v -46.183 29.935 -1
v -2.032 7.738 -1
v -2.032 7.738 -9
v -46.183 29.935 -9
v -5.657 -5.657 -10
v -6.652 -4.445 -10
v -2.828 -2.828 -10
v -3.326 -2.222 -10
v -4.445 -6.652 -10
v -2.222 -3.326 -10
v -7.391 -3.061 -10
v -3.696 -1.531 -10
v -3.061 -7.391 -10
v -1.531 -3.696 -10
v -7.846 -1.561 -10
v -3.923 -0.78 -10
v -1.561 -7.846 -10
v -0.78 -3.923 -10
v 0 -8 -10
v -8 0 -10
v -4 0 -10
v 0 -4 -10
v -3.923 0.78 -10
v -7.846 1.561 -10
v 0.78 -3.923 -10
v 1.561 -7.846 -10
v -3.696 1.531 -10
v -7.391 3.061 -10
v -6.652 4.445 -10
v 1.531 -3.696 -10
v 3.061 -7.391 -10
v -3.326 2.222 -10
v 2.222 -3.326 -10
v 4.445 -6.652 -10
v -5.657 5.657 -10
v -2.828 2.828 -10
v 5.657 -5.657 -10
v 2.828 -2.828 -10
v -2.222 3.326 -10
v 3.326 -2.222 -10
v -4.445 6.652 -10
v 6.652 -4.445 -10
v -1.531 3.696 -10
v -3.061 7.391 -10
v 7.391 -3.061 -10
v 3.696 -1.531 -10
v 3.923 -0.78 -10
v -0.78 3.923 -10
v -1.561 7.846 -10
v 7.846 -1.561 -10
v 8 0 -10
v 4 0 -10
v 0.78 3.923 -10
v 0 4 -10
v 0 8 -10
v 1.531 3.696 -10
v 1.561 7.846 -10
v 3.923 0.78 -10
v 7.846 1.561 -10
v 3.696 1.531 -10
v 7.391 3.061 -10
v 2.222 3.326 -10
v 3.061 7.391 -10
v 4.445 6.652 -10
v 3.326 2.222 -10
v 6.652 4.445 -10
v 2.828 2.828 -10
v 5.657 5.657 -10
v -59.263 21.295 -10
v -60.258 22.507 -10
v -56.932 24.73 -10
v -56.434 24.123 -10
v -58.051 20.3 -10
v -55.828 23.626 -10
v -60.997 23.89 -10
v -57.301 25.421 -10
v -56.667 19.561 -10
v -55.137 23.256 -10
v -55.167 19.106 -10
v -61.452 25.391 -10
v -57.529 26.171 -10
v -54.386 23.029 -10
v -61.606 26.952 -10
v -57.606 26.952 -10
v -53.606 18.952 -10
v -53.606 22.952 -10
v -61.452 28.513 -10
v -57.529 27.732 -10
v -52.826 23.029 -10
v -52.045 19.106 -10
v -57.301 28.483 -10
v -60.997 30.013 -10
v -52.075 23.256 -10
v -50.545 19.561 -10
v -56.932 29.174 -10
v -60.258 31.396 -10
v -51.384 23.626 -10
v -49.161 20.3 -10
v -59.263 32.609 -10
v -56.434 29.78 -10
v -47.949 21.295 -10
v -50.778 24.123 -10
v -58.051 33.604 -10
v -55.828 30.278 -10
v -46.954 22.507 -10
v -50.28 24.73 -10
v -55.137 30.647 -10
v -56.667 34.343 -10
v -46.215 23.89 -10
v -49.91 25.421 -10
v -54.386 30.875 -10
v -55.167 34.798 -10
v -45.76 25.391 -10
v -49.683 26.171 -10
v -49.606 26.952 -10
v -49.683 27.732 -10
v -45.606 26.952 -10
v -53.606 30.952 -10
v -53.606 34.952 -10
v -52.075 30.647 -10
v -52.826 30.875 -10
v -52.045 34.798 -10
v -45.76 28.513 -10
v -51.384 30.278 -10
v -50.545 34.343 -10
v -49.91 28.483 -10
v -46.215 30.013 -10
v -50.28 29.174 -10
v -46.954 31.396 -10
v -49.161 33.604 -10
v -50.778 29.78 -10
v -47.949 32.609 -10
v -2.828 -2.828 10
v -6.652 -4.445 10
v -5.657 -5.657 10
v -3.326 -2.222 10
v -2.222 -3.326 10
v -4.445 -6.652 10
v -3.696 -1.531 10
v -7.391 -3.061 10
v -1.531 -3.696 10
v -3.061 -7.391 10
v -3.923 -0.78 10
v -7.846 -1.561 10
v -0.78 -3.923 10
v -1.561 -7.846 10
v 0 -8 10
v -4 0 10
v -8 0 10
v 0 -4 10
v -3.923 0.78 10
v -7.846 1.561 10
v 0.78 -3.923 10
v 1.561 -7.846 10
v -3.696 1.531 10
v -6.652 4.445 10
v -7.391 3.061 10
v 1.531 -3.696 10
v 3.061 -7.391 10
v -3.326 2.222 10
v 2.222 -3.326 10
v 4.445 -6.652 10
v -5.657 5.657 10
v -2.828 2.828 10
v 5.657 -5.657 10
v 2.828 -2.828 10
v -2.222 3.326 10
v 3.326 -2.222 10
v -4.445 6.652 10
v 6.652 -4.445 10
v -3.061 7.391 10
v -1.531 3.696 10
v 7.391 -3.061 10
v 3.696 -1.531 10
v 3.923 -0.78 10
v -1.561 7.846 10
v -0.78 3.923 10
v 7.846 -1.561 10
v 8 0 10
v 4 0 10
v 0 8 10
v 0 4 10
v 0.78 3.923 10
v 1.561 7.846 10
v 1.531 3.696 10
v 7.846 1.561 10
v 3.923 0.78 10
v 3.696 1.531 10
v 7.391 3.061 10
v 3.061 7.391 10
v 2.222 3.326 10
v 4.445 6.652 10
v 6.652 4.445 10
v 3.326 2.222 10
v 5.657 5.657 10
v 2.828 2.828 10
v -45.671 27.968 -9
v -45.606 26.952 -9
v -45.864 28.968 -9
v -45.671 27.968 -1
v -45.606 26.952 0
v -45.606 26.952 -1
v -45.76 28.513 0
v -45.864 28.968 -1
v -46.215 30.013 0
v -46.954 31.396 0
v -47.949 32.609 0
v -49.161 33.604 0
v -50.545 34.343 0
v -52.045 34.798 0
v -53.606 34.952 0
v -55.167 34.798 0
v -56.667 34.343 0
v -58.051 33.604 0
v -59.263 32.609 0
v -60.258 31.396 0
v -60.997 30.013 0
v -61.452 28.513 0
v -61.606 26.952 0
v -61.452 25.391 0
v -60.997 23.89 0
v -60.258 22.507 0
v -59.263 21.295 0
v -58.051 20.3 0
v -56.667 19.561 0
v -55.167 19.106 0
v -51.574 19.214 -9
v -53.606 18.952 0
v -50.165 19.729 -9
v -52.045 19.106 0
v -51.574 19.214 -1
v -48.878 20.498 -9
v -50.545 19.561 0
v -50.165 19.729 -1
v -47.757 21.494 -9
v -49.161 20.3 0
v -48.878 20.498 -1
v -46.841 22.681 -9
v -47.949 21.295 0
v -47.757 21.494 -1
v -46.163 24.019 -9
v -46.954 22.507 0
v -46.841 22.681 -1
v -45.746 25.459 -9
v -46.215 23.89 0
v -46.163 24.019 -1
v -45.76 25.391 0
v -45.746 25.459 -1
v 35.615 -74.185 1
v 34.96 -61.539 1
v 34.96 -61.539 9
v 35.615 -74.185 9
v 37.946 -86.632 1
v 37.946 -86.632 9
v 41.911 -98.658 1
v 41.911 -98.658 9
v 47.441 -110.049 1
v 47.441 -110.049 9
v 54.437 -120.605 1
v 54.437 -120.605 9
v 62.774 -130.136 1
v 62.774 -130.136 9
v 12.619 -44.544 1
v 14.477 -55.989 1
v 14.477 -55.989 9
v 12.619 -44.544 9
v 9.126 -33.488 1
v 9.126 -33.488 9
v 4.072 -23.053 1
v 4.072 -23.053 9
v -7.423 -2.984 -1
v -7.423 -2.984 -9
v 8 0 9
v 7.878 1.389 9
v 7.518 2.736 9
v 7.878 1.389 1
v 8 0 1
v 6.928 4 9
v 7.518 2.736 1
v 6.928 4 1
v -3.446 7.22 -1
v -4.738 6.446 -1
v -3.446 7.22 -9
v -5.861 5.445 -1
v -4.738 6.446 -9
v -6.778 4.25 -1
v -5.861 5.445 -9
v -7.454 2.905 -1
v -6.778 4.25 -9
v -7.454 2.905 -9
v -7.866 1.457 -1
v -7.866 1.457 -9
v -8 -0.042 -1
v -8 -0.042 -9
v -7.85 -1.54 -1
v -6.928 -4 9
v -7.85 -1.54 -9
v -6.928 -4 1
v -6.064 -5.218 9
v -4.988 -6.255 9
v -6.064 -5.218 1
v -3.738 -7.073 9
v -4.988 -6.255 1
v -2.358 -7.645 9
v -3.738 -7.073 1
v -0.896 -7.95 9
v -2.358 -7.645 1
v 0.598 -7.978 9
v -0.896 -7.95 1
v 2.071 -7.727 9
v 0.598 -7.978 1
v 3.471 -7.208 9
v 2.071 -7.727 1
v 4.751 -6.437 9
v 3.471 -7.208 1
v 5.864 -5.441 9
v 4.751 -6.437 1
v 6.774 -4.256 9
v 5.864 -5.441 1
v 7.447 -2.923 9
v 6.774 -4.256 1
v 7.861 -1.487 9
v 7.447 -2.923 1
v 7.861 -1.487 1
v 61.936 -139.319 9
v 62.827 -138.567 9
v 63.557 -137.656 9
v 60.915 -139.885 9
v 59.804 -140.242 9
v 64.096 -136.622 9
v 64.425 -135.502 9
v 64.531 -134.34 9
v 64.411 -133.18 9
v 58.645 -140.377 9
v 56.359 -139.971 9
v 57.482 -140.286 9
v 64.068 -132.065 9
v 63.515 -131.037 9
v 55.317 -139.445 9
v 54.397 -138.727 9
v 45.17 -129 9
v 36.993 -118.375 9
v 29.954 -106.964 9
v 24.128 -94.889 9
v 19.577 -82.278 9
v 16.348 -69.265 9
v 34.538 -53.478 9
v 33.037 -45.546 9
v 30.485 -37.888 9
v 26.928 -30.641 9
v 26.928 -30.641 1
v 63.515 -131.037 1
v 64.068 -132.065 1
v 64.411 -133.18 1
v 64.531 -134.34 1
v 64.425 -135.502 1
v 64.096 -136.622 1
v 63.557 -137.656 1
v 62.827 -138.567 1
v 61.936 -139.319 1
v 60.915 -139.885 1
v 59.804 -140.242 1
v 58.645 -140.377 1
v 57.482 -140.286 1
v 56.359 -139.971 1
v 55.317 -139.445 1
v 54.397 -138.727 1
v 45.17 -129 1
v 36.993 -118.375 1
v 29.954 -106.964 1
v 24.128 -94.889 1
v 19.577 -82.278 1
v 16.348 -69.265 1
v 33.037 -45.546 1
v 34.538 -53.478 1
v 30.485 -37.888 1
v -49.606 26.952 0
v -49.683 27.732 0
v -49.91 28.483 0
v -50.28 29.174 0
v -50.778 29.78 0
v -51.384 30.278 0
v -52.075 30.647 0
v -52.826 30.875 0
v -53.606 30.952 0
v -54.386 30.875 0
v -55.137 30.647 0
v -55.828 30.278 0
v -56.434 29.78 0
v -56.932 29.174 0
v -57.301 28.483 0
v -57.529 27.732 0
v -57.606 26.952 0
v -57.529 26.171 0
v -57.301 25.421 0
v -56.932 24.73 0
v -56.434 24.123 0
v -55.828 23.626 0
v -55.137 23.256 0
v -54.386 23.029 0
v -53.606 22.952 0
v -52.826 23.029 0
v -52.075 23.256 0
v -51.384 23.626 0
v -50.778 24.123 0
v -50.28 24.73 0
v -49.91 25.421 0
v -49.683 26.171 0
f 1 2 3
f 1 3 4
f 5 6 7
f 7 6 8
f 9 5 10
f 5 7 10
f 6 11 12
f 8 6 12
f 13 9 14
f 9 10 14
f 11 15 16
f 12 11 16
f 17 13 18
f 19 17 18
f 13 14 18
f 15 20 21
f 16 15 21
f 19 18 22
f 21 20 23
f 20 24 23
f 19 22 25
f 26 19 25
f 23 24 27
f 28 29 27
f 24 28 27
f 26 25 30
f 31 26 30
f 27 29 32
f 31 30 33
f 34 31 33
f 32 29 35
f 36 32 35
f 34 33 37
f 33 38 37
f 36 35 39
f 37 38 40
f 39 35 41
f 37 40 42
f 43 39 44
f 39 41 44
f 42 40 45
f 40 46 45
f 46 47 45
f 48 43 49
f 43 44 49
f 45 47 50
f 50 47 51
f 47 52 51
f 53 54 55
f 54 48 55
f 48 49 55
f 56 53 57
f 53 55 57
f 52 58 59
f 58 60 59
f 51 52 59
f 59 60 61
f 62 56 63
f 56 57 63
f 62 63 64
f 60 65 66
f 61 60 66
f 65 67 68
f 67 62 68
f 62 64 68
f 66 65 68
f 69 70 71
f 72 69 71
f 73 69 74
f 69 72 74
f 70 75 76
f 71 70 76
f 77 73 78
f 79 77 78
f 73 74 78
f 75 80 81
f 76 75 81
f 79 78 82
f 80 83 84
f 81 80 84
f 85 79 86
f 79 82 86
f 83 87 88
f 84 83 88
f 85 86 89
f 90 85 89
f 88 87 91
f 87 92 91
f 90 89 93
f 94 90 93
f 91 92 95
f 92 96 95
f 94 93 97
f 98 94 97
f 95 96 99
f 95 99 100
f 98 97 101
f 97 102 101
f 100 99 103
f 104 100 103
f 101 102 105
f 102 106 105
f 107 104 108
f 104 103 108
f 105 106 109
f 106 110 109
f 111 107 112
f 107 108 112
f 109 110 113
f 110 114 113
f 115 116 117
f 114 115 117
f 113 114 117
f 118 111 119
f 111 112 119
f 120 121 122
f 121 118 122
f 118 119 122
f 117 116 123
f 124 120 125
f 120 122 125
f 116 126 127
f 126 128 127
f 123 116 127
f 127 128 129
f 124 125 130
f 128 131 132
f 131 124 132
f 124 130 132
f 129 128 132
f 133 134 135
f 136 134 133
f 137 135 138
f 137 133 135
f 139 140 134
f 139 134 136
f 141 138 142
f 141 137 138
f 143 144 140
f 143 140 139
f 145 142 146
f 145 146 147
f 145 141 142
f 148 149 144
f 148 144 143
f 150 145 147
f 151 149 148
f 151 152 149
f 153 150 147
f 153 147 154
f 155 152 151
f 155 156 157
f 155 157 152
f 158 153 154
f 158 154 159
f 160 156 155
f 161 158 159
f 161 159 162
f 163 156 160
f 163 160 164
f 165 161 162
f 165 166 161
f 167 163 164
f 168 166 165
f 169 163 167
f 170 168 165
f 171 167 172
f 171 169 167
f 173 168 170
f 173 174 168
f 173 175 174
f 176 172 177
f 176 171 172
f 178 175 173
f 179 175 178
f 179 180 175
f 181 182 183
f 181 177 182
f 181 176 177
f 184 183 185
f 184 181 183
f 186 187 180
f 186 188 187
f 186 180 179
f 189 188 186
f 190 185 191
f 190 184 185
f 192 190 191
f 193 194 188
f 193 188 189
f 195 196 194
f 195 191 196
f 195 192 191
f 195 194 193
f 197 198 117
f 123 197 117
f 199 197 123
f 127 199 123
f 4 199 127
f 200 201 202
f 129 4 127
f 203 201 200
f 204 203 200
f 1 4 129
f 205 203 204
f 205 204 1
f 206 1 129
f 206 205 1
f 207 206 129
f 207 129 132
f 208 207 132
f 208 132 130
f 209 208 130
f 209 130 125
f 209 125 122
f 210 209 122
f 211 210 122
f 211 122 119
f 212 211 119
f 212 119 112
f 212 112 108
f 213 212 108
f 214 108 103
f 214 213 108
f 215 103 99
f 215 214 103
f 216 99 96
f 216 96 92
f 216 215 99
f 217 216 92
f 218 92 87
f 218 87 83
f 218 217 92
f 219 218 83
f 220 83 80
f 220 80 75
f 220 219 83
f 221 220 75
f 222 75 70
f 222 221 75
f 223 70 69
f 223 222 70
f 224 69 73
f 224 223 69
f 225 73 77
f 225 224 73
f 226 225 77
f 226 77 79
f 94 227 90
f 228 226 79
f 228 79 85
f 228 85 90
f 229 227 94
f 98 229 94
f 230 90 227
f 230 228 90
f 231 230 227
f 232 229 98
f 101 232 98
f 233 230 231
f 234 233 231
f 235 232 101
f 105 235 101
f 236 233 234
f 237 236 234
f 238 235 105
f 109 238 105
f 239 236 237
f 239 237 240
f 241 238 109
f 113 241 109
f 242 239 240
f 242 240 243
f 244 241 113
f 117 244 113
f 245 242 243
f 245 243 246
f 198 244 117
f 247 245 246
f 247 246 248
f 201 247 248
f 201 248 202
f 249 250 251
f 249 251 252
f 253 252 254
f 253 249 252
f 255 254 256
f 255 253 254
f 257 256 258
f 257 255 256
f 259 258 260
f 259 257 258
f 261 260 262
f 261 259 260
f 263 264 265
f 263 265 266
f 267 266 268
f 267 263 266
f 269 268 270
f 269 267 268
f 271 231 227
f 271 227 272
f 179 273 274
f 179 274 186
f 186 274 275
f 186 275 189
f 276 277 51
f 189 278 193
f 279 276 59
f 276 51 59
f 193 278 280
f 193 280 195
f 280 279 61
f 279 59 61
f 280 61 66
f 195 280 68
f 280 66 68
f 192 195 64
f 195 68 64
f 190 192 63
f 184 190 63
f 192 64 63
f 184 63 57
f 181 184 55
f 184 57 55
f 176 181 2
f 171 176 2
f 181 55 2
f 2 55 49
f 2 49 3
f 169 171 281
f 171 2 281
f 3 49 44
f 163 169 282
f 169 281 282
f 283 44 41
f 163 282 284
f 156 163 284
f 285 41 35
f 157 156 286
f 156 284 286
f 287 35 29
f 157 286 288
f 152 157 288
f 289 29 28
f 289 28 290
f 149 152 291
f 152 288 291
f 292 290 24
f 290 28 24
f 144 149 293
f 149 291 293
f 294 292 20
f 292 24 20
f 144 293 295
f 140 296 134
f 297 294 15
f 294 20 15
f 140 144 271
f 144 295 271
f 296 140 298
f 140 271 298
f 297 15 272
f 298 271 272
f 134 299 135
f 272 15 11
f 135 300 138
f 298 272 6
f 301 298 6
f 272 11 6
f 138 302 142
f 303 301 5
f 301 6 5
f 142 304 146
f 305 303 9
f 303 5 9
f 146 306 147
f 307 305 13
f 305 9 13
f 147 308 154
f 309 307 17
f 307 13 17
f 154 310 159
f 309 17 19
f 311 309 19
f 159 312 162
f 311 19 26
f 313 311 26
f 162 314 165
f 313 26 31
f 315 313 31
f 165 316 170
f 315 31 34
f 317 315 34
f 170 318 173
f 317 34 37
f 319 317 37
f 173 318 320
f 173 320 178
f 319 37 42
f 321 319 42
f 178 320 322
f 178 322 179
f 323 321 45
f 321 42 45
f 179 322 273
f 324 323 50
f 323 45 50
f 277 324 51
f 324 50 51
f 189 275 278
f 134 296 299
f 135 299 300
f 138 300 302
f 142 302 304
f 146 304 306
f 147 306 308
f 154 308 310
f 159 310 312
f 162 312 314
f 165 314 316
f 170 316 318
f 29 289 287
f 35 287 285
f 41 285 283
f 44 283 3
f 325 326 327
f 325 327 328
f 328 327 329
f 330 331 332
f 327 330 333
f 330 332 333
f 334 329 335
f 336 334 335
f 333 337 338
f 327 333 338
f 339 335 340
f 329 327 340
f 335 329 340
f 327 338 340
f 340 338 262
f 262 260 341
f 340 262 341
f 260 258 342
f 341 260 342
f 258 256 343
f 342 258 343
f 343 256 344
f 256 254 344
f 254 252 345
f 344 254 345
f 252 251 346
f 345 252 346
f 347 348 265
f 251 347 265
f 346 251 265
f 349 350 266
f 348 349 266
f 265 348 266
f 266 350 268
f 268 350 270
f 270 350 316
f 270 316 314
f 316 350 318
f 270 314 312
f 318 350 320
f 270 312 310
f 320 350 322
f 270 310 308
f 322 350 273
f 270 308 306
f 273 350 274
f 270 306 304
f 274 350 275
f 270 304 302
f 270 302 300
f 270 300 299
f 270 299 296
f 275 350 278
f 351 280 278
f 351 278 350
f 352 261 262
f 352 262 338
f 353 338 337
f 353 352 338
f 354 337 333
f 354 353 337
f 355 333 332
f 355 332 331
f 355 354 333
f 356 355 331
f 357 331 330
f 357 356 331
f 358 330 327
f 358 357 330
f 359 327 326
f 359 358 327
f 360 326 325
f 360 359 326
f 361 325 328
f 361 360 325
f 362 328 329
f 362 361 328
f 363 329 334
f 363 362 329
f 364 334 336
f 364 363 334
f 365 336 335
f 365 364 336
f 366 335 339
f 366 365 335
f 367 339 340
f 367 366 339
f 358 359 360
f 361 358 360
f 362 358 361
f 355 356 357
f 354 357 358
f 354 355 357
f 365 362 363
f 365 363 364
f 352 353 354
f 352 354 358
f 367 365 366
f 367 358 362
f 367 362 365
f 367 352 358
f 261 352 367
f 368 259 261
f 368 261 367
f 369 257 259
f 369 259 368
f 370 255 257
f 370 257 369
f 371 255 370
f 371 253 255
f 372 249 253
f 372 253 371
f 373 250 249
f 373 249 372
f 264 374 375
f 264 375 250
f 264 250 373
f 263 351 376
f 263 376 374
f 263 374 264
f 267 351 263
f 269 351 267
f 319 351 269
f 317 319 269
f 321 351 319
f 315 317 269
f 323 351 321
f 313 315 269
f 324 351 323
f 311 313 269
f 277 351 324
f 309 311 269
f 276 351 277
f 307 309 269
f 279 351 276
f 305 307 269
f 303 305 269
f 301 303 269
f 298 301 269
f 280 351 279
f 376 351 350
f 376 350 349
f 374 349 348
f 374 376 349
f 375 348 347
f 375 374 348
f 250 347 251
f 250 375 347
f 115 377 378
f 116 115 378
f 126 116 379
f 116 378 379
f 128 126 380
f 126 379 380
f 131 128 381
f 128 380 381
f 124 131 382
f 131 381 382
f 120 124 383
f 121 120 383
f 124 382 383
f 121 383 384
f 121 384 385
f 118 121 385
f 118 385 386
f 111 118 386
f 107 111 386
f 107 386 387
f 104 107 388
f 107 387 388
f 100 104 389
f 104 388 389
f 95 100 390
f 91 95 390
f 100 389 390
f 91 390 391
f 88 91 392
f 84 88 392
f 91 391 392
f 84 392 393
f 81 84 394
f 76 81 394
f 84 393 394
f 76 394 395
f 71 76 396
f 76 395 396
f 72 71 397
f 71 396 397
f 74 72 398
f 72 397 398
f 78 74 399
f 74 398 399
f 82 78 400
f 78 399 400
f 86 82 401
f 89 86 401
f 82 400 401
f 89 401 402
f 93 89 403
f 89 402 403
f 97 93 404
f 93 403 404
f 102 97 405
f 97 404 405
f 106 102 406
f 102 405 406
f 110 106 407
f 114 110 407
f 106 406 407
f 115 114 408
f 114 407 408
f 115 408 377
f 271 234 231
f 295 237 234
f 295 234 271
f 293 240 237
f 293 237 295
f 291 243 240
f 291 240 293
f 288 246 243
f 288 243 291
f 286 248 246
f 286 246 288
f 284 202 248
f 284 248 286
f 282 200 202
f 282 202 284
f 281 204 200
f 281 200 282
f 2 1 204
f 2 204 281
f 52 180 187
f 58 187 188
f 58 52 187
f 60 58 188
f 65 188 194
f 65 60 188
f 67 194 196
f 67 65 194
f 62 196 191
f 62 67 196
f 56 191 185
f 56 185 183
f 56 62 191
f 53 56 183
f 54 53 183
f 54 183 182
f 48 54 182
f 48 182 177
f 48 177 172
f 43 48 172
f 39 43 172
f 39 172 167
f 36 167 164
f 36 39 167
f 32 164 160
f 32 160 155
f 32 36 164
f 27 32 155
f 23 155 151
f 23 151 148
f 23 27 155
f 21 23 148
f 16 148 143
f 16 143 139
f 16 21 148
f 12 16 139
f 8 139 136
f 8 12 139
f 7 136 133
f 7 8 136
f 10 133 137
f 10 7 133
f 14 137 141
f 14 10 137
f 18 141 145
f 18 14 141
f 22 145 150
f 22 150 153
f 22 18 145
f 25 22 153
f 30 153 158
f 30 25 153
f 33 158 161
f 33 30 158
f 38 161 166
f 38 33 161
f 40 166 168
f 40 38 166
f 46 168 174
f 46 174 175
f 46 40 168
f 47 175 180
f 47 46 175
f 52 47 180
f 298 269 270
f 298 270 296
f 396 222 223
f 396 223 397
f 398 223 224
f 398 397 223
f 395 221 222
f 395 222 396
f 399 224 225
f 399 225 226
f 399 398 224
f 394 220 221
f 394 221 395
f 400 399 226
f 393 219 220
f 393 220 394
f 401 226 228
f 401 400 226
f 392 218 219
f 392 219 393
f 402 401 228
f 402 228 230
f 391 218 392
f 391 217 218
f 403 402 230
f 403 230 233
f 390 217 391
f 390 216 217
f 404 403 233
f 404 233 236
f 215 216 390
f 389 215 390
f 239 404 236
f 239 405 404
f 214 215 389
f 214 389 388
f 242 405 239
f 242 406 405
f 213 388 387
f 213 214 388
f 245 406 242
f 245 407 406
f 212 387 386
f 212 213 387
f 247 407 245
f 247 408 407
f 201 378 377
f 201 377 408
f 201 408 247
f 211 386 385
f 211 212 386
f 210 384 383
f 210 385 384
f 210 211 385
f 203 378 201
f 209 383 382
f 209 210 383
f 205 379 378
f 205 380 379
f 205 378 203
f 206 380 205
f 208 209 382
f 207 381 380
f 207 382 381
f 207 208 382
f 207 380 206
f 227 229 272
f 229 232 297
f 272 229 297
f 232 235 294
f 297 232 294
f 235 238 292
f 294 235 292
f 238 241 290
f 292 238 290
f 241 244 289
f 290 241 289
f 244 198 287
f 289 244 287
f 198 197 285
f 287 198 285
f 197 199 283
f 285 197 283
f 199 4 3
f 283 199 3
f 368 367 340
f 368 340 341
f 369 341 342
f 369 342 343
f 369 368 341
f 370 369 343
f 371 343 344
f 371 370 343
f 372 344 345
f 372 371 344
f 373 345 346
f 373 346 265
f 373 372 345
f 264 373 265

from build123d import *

# Parameters (mm, degrees)
SKETCH_1_R        = 8
SKETCH_1_R_2      = 4
EXTRUDE_1_DEPTH   = 10
EXTRUDE_1_2_DEPTH = 10
EXTRUDE_START     = -1
EXTRUDE_2_DEPTH   = 8
EXTRUDE_START_2   = 1
EXTRUDE_3_DEPTH   = 8
SKETCH_5_R        = 8
SKETCH_5_R_2      = 4
EXTRUDE_4_DEPTH   = 10


with BuildPart() as part:
    # 草图1 → 凸台-拉伸1 (new body)
    with BuildSketch(Plane.XY):
        Circle(SKETCH_1_R)
        Circle(SKETCH_1_R_2, mode=Mode.SUBTRACT)
    extrude(amount=-EXTRUDE_1_DEPTH)



with BuildPart() as body_2:
    # 草图1 → Extrude 1 2 (new body)
    with BuildSketch(Plane.XY):
        with Locations((-53.605968084, 26.951812291)):
            Circle(SKETCH_1_R)
        with Locations((-53.605968084, 26.951812291)):
            Circle(SKETCH_1_R_2, mode=Mode.SUBTRACT)
    extrude(amount=-EXTRUDE_1_2_DEPTH)


with BuildPart() as part_1:
    add(part.part)

    add(body_2.part)  # 凸台-拉伸2 merges body 2
    # 草图3 → 凸台-拉伸2 (add)
    with BuildSketch(Plane.XY.offset(EXTRUDE_START)):
        with BuildLine():
            Line((-51.573547302, 19.214289059), (-7.42278324, -2.983670385))
            ThreePointArc((-7.42278324, -2.983670385), (-7.147462411, 3.593574972), (-2.032420782, 7.737523232))
            Line((-2.032420782, 7.737523232), (-46.183184844, 29.935482676))
            ThreePointArc((-46.183184844, 29.935482676), (-46.458505673, 23.358237319), (-51.573547302, 19.214289059))
        make_face()
    extrude(amount=-EXTRUDE_2_DEPTH)



with BuildPart() as body_2_2:
    # 草图4 → 凸台-拉伸3 (new body)
    with BuildSketch(Plane.XY.offset(EXTRUDE_START_2)):
        with BuildLine():
            Line((6.92820323, 4), (26.92820323, -30.641016151))
            ThreePointArc((26.92820323, -30.641016151), (33.036798625, -45.545943872), (34.959960983, -61.538856509))
            ThreePointArc((34.959960983, -61.538856509), (41.911210079, -98.657642521), (62.774179905, -130.135581289))
            ThreePointArc((62.774179905, -130.135581289), (62.827441336, -138.566924041), (54.397444356, -138.726699833))
            ThreePointArc((54.397444356, -138.726699833), (26.885397662, -101.001387411), (14.477282647, -55.988604867))
            ThreePointArc((14.477282647, -55.988604867), (11.073298234, -38.952300047), (4.07179677, -23.052558883))
            Line((4.07179677, -23.052558883), (-6.92820323, -4))
            ThreePointArc((-6.92820323, -4), (4, -6.92820323), (6.92820323, 4))
        make_face()
    extrude(amount=EXTRUDE_3_DEPTH)


with BuildPart() as part_2:
    add(part_1.part)

    add(body_2_2.part)  # 凸台-拉伸4 merges body 2 2
    # 草图5 → 凸台-拉伸4 (add)
    with BuildSketch(Plane.XY):
        Circle(SKETCH_5_R)
        Circle(SKETCH_5_R_2, mode=Mode.SUBTRACT)
    extrude(amount=EXTRUDE_4_DEPTH)


solid = part_2.part
